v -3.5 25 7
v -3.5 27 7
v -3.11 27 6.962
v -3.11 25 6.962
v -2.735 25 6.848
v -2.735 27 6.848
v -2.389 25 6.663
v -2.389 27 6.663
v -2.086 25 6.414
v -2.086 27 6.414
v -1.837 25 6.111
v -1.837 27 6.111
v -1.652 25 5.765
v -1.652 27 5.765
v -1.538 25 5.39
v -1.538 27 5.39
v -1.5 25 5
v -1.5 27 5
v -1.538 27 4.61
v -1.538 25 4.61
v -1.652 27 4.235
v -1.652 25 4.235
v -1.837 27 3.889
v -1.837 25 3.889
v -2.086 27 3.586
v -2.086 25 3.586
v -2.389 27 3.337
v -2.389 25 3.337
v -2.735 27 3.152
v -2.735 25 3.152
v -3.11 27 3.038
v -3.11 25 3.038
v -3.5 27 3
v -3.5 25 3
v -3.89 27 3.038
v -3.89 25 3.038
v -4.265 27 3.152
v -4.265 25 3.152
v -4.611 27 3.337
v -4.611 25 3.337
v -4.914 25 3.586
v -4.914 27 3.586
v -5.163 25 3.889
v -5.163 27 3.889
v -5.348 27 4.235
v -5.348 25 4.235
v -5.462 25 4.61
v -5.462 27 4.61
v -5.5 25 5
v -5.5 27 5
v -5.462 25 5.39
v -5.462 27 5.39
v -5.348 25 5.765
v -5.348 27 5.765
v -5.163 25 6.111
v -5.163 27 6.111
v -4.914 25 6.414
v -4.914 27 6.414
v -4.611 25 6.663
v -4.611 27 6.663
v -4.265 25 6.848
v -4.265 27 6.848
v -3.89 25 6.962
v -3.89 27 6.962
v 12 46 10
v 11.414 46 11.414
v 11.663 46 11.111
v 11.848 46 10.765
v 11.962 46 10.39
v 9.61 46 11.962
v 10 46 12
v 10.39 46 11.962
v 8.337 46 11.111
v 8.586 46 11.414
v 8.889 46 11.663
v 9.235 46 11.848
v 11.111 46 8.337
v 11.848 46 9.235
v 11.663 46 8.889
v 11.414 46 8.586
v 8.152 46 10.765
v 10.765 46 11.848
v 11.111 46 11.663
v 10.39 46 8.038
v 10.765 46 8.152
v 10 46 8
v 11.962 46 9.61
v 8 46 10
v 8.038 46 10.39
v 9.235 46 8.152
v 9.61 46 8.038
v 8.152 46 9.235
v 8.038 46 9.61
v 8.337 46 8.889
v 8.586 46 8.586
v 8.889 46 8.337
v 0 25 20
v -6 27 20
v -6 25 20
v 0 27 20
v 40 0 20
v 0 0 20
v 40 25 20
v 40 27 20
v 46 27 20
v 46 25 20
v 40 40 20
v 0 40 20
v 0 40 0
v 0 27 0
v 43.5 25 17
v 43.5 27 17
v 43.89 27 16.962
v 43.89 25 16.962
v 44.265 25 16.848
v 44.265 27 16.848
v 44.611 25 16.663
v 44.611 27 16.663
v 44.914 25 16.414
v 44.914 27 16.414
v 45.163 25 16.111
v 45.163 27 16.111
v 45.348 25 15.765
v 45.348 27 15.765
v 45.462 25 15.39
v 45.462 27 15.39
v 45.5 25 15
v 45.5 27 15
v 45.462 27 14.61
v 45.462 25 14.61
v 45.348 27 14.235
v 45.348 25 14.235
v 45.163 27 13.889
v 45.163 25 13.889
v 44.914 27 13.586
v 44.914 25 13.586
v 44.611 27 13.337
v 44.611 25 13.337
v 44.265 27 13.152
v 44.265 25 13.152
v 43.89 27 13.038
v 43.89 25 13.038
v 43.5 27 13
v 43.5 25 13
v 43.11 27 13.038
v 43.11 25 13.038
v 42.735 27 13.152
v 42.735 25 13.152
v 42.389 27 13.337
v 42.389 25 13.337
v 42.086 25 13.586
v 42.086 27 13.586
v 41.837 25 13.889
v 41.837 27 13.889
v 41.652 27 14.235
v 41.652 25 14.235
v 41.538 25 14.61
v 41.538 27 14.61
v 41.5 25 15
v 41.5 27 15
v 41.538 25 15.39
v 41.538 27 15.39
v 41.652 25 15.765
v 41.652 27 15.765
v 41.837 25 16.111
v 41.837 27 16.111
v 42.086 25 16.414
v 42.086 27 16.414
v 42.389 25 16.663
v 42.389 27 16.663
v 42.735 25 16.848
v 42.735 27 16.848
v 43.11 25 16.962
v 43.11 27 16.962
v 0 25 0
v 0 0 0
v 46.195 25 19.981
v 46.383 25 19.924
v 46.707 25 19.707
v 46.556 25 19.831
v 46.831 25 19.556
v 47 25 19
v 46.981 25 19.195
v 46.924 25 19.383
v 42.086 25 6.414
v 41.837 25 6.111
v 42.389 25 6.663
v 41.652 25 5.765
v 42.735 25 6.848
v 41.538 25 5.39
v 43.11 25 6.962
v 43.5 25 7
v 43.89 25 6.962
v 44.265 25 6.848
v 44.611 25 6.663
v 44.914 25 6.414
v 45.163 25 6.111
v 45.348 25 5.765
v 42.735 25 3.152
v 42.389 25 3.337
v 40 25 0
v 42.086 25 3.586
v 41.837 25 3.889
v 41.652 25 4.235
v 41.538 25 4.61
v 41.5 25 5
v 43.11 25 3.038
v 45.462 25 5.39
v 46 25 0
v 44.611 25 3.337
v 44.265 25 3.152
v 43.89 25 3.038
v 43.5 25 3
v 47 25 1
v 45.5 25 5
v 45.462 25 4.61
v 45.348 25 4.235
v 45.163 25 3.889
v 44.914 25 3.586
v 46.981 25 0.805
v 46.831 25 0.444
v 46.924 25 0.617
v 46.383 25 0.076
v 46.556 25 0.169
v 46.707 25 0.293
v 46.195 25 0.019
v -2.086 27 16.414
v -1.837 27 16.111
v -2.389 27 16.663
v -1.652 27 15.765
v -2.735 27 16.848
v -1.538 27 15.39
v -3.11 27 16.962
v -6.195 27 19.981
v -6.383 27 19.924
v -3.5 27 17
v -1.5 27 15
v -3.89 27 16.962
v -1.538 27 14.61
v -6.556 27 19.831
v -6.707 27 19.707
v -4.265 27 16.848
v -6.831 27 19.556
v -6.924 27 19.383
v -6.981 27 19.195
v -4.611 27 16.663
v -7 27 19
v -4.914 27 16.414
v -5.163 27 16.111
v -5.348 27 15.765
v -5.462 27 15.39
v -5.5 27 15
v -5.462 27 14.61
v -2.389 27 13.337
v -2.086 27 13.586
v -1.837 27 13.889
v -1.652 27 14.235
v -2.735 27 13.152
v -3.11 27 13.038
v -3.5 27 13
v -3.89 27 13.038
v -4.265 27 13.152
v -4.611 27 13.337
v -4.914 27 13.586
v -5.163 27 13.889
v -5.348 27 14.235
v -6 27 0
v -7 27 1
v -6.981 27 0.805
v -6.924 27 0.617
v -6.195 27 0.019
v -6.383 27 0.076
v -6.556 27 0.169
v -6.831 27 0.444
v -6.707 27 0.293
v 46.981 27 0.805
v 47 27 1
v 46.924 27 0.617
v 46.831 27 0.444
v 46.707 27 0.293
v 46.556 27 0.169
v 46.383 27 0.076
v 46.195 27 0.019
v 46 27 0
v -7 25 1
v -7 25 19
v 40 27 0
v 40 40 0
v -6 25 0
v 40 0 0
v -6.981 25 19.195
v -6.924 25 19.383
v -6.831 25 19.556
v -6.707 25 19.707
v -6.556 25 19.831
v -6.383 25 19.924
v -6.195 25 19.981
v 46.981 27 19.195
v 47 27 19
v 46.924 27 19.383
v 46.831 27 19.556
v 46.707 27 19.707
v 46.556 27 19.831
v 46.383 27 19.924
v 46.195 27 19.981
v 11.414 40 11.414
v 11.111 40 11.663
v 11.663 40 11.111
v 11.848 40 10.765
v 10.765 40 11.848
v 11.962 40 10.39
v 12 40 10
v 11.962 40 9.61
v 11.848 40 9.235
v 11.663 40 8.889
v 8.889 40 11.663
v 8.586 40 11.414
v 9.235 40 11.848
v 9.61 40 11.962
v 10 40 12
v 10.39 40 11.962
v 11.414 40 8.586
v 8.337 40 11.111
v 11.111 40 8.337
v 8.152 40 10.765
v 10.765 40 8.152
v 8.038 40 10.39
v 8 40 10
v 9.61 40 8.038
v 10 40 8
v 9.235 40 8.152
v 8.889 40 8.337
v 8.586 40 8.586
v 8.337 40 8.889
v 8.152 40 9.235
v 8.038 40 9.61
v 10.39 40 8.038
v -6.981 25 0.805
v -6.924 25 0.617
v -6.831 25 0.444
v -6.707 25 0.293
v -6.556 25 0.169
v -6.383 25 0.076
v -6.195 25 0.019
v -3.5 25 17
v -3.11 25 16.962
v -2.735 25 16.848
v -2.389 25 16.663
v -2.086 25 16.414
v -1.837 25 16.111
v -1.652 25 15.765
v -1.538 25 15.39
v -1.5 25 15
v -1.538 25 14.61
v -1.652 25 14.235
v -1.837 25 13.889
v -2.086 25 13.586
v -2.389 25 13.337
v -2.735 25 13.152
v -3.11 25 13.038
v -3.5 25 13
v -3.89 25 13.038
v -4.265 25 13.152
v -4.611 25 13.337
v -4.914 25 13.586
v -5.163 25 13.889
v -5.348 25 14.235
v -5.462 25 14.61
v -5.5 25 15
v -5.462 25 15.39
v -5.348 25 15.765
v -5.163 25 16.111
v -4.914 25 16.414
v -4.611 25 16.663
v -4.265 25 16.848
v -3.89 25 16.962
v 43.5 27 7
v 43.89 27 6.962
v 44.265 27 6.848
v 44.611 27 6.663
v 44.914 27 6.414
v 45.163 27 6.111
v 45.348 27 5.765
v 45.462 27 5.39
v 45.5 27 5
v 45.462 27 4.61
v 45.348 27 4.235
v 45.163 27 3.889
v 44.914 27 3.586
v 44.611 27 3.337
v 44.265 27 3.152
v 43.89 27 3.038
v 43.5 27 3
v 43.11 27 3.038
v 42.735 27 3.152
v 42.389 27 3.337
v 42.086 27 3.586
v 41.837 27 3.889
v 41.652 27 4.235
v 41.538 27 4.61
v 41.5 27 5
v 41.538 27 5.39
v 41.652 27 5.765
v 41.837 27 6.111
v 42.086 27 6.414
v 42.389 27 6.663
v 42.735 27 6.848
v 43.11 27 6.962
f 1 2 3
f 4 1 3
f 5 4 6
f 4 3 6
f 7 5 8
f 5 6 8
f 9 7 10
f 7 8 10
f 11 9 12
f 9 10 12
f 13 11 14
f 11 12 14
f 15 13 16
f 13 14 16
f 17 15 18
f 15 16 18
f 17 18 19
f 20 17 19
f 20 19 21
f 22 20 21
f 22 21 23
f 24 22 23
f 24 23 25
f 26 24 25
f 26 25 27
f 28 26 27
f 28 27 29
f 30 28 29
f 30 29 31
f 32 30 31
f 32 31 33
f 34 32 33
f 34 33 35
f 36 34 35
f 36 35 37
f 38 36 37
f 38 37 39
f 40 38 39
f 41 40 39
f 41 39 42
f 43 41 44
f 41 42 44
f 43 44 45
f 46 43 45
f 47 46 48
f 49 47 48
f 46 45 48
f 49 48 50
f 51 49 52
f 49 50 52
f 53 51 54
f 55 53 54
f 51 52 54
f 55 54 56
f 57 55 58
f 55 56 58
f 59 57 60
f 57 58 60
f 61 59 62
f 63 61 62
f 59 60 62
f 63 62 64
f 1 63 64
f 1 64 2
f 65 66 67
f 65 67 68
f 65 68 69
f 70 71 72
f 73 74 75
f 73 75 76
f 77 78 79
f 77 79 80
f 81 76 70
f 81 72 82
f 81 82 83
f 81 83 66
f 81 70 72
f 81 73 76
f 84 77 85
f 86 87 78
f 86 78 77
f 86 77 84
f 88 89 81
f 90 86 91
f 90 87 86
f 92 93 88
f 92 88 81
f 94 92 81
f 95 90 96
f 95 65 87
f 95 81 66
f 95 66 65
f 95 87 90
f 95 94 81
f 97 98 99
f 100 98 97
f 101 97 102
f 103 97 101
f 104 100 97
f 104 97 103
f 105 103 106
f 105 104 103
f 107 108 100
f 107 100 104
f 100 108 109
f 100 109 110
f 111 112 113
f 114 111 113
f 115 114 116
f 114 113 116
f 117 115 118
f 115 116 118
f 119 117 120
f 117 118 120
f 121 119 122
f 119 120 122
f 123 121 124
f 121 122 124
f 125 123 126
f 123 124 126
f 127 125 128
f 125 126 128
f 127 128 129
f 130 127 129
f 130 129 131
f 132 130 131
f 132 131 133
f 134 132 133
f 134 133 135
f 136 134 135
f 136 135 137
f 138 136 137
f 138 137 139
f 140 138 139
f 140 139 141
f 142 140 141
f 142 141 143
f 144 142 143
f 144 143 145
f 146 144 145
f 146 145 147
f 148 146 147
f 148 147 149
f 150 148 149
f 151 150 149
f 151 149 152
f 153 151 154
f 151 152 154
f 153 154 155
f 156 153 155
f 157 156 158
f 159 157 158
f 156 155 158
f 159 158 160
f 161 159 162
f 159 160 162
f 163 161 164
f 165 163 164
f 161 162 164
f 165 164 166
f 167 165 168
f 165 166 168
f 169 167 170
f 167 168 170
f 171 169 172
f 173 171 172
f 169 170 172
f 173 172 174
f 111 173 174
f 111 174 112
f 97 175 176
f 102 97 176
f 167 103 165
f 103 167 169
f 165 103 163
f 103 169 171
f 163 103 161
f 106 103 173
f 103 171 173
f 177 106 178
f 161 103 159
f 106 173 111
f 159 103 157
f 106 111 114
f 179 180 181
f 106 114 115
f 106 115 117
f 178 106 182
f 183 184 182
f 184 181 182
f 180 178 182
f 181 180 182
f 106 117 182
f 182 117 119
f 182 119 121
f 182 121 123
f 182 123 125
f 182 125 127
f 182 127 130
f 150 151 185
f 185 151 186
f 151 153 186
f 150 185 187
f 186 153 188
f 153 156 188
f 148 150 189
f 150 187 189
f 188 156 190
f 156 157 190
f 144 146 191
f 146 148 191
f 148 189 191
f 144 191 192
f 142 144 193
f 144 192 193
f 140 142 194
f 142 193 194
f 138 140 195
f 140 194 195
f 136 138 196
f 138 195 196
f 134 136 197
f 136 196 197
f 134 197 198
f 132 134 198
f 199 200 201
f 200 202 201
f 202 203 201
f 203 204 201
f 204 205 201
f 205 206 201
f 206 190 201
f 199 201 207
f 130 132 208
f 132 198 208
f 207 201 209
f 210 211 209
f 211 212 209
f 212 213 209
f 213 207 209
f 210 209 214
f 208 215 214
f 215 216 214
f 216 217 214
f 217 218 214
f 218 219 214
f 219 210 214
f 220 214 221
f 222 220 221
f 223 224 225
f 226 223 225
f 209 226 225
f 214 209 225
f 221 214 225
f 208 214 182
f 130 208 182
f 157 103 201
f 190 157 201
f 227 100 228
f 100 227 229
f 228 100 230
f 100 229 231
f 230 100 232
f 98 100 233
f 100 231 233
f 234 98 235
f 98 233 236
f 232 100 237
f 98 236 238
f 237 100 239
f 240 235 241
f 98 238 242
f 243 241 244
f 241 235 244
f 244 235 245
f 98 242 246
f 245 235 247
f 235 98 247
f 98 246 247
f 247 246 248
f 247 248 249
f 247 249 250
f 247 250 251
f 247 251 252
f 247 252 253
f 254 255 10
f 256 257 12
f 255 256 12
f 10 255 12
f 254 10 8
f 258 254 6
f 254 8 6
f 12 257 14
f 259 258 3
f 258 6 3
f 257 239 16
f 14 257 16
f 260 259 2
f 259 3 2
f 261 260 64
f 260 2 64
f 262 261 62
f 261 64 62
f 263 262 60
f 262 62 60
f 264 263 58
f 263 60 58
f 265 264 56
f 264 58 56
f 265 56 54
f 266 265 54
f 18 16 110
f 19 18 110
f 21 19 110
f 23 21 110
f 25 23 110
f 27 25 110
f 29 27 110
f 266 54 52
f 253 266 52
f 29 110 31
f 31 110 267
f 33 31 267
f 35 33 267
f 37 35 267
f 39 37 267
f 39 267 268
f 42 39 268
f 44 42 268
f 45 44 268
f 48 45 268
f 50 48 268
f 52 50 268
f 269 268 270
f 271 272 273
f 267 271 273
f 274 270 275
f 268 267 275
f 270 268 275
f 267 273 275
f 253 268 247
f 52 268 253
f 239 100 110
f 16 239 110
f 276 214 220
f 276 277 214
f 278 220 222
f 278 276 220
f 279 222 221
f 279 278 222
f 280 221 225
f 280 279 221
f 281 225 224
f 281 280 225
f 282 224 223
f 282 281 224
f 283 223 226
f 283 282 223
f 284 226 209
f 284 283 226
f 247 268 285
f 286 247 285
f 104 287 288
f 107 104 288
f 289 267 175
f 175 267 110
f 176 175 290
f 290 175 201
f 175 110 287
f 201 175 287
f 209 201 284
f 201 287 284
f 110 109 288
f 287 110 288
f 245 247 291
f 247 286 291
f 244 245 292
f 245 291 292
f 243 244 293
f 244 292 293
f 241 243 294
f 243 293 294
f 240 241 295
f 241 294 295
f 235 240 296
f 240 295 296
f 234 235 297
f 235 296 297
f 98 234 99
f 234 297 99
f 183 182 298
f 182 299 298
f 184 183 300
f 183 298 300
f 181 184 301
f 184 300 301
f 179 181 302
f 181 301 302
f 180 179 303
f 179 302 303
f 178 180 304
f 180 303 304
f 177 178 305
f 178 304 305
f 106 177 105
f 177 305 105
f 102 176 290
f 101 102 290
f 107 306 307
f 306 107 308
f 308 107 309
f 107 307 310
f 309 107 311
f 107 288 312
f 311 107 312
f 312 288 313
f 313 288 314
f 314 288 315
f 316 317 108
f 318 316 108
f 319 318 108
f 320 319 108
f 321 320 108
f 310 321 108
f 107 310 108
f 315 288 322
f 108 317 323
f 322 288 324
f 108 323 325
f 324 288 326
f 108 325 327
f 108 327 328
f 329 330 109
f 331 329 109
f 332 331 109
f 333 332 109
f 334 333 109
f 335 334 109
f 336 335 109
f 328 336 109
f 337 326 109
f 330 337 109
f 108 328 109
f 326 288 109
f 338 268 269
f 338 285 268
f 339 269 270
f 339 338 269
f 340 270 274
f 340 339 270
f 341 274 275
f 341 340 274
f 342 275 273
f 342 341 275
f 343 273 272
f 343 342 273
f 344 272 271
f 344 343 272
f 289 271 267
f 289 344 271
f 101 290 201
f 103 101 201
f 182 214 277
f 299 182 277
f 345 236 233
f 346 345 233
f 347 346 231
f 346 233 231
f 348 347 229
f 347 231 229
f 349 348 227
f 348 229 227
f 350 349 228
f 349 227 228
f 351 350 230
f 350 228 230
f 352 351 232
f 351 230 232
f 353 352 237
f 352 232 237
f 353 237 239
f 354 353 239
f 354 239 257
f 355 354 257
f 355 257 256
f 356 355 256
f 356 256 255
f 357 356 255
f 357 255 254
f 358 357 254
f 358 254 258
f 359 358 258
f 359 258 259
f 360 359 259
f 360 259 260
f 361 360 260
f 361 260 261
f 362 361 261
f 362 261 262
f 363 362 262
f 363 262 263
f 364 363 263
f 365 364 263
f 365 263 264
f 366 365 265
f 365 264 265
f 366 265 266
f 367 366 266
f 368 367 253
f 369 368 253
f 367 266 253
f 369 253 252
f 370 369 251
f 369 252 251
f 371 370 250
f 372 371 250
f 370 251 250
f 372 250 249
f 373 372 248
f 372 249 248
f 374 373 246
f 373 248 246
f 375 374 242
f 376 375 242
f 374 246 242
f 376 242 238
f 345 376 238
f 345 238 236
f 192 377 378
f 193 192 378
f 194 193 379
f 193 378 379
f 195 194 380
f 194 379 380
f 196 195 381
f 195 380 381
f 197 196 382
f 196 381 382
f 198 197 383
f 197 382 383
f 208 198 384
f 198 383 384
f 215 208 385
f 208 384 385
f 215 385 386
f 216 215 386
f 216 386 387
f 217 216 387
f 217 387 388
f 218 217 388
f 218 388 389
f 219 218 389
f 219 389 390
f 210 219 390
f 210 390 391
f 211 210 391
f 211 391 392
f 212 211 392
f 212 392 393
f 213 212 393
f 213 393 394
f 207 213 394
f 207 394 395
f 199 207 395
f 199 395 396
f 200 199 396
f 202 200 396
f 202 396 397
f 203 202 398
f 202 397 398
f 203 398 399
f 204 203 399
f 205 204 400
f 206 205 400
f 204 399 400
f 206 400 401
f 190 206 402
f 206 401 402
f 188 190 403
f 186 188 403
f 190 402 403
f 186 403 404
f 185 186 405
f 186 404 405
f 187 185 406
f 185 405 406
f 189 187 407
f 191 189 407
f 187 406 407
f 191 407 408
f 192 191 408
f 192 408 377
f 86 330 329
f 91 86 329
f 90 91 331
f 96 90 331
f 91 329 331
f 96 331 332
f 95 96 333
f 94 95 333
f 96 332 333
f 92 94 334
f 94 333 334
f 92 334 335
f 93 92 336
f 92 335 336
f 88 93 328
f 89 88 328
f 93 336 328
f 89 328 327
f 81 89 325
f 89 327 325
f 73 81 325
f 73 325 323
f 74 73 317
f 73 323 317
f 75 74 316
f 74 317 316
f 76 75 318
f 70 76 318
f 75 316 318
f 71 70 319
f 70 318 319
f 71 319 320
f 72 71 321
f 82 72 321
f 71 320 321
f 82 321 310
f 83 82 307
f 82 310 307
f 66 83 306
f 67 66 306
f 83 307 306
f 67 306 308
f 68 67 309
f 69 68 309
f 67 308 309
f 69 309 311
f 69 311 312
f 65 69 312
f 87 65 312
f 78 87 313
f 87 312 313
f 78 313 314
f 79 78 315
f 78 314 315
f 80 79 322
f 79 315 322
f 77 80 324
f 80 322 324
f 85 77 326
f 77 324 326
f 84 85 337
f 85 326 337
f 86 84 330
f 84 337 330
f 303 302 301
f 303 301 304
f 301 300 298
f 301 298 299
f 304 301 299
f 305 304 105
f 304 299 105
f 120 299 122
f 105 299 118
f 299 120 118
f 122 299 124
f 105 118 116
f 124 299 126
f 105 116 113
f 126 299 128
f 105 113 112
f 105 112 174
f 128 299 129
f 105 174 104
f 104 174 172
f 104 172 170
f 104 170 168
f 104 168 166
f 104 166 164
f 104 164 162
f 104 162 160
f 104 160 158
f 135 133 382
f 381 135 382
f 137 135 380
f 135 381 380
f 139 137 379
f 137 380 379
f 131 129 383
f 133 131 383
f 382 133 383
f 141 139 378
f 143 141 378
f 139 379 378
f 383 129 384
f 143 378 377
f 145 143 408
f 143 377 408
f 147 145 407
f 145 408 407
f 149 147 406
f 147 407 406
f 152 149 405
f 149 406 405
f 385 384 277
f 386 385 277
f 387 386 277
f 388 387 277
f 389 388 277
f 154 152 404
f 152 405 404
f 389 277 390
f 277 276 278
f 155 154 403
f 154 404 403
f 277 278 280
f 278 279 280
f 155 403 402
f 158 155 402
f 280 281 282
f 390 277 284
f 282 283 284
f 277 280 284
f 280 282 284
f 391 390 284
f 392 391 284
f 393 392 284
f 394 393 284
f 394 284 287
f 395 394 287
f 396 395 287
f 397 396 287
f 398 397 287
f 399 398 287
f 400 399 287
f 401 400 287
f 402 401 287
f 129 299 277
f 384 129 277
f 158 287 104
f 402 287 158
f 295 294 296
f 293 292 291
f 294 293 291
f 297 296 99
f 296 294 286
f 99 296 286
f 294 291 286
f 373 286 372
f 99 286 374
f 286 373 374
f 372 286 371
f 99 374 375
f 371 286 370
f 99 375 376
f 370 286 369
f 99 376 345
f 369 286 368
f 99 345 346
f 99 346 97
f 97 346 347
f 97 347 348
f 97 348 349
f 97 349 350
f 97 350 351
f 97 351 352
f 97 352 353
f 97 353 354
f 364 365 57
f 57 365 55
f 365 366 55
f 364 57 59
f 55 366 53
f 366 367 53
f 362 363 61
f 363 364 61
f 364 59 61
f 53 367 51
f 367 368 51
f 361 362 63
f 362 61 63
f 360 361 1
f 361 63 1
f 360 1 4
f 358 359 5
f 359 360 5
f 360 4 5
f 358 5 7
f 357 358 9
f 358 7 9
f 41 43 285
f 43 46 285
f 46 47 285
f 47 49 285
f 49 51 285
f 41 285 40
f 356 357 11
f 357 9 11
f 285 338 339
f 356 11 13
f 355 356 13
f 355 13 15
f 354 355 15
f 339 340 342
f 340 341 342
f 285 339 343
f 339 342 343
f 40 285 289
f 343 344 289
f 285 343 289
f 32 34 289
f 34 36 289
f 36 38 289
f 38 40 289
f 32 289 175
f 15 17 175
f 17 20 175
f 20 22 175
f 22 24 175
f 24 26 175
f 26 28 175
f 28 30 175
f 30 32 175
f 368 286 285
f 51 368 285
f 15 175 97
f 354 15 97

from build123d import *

# Parameters (mm, degrees)
Y_KSEKLIK_EKSTR_ZYON1_DEPTH = 20
RADYUS1_R                   = 1
KES_EKSTR_ZYON1_REACH       = 59.775
IZIM2_R                     = 2
IZIM3_R                     = 2
Y_KSEKLIK_EKSTR_ZYON2_DEPTH = 6


with BuildPart() as part:
    # Çizim1 → Yükseklik-Ekstrüzyon1 (new body)
    with BuildSketch(Plane.XY):
        Polygon((0, 0), (40, 0), (40, 25), (47, 25), (47, 27), (40, 27), (40, 40), (0, 40), (0, 27), (-7, 27), (-7, 25), (0, 25), align=None)
    extrude(amount=Y_KSEKLIK_EKSTR_ZYON1_DEPTH)

    # Radyus1
    radyus1_edges = [part.edges().sort_by_distance(p)[0] for p in [
        (-7, 26, 0),
        (47, 26, 0),
        (47, 26, 20),
        (-7, 26, 20),
    ]]
    fillet(radyus1_edges, radius=RADYUS1_R)

    # Çizim2 → Kes-Ekstrüzyon1 (cut, up to next)
    with BuildSketch(Plane(origin=(0, 27, 0), x_dir=(1, 0, 0), z_dir=(0, 1, 0)), mode=Mode.PRIVATE) as kes_ekstr_zyon1_sk1:
        with Locations(Location((-3.5, -5, 0), (0, 0, 270))):
            Circle(IZIM2_R)
    kes_ekstr_zyon1_tool1 = extrude(kes_ekstr_zyon1_sk1.sketch, amount=-KES_EKSTR_ZYON1_REACH, mode=Mode.PRIVATE) & part.part
    # Çizim2 → Kes-Ekstrüzyon1 (cut, up to next)
    with BuildSketch(Plane(origin=(0, 27, 0), x_dir=(1, 0, 0), z_dir=(0, 1, 0)), mode=Mode.PRIVATE) as kes_ekstr_zyon1_sk2:
        with Locations(Location((-3.5, -15, 0), (0, 0, 270))):
            Circle(IZIM2_R)
    kes_ekstr_zyon1_tool2 = extrude(kes_ekstr_zyon1_sk2.sketch, amount=-KES_EKSTR_ZYON1_REACH, mode=Mode.PRIVATE) & part.part
    # Çizim2 → Kes-Ekstrüzyon1 (cut, up to next)
    with BuildSketch(Plane(origin=(0, 27, 0), x_dir=(1, 0, 0), z_dir=(0, 1, 0)), mode=Mode.PRIVATE) as kes_ekstr_zyon1_sk3:
        with Locations(Location((43.5, -5, 0), (0, 0, 270))):
            Circle(IZIM2_R)
    kes_ekstr_zyon1_tool3 = extrude(kes_ekstr_zyon1_sk3.sketch, amount=-KES_EKSTR_ZYON1_REACH, mode=Mode.PRIVATE) & part.part
    # Çizim2 → Kes-Ekstrüzyon1 (cut, up to next)
    with BuildSketch(Plane(origin=(0, 27, 0), x_dir=(1, 0, 0), z_dir=(0, 1, 0)), mode=Mode.PRIVATE) as kes_ekstr_zyon1_sk4:
        with Locations(Location((43.5, -15, 0), (0, 0, 270))):
            Circle(IZIM2_R)
    kes_ekstr_zyon1_tool4 = extrude(kes_ekstr_zyon1_sk4.sketch, amount=-KES_EKSTR_ZYON1_REACH, mode=Mode.PRIVATE) & part.part
    add(kes_ekstr_zyon1_tool1.solids().sort_by_distance((-3.5, 27, 5))[0], mode=Mode.SUBTRACT)
    add(kes_ekstr_zyon1_tool2.solids().sort_by_distance((-3.5, 27, 15))[0], mode=Mode.SUBTRACT)
    add(kes_ekstr_zyon1_tool3.solids().sort_by_distance((43.5, 27, 5))[0], mode=Mode.SUBTRACT)
    add(kes_ekstr_zyon1_tool4.solids().sort_by_distance((43.5, 27, 15))[0], mode=Mode.SUBTRACT)

    # Çizim3 → Yükseklik-Ekstrüzyon2 (add)
    with BuildSketch(Plane(origin=(0, 40, 0), x_dir=(1, 0, 0), z_dir=(0, 1, 0))):
        with Locations(Location((10, -10, 0), (0, 0, 90))):
            Circle(IZIM3_R)
    extrude(amount=Y_KSEKLIK_EKSTR_ZYON2_DEPTH)


solid = part.part
